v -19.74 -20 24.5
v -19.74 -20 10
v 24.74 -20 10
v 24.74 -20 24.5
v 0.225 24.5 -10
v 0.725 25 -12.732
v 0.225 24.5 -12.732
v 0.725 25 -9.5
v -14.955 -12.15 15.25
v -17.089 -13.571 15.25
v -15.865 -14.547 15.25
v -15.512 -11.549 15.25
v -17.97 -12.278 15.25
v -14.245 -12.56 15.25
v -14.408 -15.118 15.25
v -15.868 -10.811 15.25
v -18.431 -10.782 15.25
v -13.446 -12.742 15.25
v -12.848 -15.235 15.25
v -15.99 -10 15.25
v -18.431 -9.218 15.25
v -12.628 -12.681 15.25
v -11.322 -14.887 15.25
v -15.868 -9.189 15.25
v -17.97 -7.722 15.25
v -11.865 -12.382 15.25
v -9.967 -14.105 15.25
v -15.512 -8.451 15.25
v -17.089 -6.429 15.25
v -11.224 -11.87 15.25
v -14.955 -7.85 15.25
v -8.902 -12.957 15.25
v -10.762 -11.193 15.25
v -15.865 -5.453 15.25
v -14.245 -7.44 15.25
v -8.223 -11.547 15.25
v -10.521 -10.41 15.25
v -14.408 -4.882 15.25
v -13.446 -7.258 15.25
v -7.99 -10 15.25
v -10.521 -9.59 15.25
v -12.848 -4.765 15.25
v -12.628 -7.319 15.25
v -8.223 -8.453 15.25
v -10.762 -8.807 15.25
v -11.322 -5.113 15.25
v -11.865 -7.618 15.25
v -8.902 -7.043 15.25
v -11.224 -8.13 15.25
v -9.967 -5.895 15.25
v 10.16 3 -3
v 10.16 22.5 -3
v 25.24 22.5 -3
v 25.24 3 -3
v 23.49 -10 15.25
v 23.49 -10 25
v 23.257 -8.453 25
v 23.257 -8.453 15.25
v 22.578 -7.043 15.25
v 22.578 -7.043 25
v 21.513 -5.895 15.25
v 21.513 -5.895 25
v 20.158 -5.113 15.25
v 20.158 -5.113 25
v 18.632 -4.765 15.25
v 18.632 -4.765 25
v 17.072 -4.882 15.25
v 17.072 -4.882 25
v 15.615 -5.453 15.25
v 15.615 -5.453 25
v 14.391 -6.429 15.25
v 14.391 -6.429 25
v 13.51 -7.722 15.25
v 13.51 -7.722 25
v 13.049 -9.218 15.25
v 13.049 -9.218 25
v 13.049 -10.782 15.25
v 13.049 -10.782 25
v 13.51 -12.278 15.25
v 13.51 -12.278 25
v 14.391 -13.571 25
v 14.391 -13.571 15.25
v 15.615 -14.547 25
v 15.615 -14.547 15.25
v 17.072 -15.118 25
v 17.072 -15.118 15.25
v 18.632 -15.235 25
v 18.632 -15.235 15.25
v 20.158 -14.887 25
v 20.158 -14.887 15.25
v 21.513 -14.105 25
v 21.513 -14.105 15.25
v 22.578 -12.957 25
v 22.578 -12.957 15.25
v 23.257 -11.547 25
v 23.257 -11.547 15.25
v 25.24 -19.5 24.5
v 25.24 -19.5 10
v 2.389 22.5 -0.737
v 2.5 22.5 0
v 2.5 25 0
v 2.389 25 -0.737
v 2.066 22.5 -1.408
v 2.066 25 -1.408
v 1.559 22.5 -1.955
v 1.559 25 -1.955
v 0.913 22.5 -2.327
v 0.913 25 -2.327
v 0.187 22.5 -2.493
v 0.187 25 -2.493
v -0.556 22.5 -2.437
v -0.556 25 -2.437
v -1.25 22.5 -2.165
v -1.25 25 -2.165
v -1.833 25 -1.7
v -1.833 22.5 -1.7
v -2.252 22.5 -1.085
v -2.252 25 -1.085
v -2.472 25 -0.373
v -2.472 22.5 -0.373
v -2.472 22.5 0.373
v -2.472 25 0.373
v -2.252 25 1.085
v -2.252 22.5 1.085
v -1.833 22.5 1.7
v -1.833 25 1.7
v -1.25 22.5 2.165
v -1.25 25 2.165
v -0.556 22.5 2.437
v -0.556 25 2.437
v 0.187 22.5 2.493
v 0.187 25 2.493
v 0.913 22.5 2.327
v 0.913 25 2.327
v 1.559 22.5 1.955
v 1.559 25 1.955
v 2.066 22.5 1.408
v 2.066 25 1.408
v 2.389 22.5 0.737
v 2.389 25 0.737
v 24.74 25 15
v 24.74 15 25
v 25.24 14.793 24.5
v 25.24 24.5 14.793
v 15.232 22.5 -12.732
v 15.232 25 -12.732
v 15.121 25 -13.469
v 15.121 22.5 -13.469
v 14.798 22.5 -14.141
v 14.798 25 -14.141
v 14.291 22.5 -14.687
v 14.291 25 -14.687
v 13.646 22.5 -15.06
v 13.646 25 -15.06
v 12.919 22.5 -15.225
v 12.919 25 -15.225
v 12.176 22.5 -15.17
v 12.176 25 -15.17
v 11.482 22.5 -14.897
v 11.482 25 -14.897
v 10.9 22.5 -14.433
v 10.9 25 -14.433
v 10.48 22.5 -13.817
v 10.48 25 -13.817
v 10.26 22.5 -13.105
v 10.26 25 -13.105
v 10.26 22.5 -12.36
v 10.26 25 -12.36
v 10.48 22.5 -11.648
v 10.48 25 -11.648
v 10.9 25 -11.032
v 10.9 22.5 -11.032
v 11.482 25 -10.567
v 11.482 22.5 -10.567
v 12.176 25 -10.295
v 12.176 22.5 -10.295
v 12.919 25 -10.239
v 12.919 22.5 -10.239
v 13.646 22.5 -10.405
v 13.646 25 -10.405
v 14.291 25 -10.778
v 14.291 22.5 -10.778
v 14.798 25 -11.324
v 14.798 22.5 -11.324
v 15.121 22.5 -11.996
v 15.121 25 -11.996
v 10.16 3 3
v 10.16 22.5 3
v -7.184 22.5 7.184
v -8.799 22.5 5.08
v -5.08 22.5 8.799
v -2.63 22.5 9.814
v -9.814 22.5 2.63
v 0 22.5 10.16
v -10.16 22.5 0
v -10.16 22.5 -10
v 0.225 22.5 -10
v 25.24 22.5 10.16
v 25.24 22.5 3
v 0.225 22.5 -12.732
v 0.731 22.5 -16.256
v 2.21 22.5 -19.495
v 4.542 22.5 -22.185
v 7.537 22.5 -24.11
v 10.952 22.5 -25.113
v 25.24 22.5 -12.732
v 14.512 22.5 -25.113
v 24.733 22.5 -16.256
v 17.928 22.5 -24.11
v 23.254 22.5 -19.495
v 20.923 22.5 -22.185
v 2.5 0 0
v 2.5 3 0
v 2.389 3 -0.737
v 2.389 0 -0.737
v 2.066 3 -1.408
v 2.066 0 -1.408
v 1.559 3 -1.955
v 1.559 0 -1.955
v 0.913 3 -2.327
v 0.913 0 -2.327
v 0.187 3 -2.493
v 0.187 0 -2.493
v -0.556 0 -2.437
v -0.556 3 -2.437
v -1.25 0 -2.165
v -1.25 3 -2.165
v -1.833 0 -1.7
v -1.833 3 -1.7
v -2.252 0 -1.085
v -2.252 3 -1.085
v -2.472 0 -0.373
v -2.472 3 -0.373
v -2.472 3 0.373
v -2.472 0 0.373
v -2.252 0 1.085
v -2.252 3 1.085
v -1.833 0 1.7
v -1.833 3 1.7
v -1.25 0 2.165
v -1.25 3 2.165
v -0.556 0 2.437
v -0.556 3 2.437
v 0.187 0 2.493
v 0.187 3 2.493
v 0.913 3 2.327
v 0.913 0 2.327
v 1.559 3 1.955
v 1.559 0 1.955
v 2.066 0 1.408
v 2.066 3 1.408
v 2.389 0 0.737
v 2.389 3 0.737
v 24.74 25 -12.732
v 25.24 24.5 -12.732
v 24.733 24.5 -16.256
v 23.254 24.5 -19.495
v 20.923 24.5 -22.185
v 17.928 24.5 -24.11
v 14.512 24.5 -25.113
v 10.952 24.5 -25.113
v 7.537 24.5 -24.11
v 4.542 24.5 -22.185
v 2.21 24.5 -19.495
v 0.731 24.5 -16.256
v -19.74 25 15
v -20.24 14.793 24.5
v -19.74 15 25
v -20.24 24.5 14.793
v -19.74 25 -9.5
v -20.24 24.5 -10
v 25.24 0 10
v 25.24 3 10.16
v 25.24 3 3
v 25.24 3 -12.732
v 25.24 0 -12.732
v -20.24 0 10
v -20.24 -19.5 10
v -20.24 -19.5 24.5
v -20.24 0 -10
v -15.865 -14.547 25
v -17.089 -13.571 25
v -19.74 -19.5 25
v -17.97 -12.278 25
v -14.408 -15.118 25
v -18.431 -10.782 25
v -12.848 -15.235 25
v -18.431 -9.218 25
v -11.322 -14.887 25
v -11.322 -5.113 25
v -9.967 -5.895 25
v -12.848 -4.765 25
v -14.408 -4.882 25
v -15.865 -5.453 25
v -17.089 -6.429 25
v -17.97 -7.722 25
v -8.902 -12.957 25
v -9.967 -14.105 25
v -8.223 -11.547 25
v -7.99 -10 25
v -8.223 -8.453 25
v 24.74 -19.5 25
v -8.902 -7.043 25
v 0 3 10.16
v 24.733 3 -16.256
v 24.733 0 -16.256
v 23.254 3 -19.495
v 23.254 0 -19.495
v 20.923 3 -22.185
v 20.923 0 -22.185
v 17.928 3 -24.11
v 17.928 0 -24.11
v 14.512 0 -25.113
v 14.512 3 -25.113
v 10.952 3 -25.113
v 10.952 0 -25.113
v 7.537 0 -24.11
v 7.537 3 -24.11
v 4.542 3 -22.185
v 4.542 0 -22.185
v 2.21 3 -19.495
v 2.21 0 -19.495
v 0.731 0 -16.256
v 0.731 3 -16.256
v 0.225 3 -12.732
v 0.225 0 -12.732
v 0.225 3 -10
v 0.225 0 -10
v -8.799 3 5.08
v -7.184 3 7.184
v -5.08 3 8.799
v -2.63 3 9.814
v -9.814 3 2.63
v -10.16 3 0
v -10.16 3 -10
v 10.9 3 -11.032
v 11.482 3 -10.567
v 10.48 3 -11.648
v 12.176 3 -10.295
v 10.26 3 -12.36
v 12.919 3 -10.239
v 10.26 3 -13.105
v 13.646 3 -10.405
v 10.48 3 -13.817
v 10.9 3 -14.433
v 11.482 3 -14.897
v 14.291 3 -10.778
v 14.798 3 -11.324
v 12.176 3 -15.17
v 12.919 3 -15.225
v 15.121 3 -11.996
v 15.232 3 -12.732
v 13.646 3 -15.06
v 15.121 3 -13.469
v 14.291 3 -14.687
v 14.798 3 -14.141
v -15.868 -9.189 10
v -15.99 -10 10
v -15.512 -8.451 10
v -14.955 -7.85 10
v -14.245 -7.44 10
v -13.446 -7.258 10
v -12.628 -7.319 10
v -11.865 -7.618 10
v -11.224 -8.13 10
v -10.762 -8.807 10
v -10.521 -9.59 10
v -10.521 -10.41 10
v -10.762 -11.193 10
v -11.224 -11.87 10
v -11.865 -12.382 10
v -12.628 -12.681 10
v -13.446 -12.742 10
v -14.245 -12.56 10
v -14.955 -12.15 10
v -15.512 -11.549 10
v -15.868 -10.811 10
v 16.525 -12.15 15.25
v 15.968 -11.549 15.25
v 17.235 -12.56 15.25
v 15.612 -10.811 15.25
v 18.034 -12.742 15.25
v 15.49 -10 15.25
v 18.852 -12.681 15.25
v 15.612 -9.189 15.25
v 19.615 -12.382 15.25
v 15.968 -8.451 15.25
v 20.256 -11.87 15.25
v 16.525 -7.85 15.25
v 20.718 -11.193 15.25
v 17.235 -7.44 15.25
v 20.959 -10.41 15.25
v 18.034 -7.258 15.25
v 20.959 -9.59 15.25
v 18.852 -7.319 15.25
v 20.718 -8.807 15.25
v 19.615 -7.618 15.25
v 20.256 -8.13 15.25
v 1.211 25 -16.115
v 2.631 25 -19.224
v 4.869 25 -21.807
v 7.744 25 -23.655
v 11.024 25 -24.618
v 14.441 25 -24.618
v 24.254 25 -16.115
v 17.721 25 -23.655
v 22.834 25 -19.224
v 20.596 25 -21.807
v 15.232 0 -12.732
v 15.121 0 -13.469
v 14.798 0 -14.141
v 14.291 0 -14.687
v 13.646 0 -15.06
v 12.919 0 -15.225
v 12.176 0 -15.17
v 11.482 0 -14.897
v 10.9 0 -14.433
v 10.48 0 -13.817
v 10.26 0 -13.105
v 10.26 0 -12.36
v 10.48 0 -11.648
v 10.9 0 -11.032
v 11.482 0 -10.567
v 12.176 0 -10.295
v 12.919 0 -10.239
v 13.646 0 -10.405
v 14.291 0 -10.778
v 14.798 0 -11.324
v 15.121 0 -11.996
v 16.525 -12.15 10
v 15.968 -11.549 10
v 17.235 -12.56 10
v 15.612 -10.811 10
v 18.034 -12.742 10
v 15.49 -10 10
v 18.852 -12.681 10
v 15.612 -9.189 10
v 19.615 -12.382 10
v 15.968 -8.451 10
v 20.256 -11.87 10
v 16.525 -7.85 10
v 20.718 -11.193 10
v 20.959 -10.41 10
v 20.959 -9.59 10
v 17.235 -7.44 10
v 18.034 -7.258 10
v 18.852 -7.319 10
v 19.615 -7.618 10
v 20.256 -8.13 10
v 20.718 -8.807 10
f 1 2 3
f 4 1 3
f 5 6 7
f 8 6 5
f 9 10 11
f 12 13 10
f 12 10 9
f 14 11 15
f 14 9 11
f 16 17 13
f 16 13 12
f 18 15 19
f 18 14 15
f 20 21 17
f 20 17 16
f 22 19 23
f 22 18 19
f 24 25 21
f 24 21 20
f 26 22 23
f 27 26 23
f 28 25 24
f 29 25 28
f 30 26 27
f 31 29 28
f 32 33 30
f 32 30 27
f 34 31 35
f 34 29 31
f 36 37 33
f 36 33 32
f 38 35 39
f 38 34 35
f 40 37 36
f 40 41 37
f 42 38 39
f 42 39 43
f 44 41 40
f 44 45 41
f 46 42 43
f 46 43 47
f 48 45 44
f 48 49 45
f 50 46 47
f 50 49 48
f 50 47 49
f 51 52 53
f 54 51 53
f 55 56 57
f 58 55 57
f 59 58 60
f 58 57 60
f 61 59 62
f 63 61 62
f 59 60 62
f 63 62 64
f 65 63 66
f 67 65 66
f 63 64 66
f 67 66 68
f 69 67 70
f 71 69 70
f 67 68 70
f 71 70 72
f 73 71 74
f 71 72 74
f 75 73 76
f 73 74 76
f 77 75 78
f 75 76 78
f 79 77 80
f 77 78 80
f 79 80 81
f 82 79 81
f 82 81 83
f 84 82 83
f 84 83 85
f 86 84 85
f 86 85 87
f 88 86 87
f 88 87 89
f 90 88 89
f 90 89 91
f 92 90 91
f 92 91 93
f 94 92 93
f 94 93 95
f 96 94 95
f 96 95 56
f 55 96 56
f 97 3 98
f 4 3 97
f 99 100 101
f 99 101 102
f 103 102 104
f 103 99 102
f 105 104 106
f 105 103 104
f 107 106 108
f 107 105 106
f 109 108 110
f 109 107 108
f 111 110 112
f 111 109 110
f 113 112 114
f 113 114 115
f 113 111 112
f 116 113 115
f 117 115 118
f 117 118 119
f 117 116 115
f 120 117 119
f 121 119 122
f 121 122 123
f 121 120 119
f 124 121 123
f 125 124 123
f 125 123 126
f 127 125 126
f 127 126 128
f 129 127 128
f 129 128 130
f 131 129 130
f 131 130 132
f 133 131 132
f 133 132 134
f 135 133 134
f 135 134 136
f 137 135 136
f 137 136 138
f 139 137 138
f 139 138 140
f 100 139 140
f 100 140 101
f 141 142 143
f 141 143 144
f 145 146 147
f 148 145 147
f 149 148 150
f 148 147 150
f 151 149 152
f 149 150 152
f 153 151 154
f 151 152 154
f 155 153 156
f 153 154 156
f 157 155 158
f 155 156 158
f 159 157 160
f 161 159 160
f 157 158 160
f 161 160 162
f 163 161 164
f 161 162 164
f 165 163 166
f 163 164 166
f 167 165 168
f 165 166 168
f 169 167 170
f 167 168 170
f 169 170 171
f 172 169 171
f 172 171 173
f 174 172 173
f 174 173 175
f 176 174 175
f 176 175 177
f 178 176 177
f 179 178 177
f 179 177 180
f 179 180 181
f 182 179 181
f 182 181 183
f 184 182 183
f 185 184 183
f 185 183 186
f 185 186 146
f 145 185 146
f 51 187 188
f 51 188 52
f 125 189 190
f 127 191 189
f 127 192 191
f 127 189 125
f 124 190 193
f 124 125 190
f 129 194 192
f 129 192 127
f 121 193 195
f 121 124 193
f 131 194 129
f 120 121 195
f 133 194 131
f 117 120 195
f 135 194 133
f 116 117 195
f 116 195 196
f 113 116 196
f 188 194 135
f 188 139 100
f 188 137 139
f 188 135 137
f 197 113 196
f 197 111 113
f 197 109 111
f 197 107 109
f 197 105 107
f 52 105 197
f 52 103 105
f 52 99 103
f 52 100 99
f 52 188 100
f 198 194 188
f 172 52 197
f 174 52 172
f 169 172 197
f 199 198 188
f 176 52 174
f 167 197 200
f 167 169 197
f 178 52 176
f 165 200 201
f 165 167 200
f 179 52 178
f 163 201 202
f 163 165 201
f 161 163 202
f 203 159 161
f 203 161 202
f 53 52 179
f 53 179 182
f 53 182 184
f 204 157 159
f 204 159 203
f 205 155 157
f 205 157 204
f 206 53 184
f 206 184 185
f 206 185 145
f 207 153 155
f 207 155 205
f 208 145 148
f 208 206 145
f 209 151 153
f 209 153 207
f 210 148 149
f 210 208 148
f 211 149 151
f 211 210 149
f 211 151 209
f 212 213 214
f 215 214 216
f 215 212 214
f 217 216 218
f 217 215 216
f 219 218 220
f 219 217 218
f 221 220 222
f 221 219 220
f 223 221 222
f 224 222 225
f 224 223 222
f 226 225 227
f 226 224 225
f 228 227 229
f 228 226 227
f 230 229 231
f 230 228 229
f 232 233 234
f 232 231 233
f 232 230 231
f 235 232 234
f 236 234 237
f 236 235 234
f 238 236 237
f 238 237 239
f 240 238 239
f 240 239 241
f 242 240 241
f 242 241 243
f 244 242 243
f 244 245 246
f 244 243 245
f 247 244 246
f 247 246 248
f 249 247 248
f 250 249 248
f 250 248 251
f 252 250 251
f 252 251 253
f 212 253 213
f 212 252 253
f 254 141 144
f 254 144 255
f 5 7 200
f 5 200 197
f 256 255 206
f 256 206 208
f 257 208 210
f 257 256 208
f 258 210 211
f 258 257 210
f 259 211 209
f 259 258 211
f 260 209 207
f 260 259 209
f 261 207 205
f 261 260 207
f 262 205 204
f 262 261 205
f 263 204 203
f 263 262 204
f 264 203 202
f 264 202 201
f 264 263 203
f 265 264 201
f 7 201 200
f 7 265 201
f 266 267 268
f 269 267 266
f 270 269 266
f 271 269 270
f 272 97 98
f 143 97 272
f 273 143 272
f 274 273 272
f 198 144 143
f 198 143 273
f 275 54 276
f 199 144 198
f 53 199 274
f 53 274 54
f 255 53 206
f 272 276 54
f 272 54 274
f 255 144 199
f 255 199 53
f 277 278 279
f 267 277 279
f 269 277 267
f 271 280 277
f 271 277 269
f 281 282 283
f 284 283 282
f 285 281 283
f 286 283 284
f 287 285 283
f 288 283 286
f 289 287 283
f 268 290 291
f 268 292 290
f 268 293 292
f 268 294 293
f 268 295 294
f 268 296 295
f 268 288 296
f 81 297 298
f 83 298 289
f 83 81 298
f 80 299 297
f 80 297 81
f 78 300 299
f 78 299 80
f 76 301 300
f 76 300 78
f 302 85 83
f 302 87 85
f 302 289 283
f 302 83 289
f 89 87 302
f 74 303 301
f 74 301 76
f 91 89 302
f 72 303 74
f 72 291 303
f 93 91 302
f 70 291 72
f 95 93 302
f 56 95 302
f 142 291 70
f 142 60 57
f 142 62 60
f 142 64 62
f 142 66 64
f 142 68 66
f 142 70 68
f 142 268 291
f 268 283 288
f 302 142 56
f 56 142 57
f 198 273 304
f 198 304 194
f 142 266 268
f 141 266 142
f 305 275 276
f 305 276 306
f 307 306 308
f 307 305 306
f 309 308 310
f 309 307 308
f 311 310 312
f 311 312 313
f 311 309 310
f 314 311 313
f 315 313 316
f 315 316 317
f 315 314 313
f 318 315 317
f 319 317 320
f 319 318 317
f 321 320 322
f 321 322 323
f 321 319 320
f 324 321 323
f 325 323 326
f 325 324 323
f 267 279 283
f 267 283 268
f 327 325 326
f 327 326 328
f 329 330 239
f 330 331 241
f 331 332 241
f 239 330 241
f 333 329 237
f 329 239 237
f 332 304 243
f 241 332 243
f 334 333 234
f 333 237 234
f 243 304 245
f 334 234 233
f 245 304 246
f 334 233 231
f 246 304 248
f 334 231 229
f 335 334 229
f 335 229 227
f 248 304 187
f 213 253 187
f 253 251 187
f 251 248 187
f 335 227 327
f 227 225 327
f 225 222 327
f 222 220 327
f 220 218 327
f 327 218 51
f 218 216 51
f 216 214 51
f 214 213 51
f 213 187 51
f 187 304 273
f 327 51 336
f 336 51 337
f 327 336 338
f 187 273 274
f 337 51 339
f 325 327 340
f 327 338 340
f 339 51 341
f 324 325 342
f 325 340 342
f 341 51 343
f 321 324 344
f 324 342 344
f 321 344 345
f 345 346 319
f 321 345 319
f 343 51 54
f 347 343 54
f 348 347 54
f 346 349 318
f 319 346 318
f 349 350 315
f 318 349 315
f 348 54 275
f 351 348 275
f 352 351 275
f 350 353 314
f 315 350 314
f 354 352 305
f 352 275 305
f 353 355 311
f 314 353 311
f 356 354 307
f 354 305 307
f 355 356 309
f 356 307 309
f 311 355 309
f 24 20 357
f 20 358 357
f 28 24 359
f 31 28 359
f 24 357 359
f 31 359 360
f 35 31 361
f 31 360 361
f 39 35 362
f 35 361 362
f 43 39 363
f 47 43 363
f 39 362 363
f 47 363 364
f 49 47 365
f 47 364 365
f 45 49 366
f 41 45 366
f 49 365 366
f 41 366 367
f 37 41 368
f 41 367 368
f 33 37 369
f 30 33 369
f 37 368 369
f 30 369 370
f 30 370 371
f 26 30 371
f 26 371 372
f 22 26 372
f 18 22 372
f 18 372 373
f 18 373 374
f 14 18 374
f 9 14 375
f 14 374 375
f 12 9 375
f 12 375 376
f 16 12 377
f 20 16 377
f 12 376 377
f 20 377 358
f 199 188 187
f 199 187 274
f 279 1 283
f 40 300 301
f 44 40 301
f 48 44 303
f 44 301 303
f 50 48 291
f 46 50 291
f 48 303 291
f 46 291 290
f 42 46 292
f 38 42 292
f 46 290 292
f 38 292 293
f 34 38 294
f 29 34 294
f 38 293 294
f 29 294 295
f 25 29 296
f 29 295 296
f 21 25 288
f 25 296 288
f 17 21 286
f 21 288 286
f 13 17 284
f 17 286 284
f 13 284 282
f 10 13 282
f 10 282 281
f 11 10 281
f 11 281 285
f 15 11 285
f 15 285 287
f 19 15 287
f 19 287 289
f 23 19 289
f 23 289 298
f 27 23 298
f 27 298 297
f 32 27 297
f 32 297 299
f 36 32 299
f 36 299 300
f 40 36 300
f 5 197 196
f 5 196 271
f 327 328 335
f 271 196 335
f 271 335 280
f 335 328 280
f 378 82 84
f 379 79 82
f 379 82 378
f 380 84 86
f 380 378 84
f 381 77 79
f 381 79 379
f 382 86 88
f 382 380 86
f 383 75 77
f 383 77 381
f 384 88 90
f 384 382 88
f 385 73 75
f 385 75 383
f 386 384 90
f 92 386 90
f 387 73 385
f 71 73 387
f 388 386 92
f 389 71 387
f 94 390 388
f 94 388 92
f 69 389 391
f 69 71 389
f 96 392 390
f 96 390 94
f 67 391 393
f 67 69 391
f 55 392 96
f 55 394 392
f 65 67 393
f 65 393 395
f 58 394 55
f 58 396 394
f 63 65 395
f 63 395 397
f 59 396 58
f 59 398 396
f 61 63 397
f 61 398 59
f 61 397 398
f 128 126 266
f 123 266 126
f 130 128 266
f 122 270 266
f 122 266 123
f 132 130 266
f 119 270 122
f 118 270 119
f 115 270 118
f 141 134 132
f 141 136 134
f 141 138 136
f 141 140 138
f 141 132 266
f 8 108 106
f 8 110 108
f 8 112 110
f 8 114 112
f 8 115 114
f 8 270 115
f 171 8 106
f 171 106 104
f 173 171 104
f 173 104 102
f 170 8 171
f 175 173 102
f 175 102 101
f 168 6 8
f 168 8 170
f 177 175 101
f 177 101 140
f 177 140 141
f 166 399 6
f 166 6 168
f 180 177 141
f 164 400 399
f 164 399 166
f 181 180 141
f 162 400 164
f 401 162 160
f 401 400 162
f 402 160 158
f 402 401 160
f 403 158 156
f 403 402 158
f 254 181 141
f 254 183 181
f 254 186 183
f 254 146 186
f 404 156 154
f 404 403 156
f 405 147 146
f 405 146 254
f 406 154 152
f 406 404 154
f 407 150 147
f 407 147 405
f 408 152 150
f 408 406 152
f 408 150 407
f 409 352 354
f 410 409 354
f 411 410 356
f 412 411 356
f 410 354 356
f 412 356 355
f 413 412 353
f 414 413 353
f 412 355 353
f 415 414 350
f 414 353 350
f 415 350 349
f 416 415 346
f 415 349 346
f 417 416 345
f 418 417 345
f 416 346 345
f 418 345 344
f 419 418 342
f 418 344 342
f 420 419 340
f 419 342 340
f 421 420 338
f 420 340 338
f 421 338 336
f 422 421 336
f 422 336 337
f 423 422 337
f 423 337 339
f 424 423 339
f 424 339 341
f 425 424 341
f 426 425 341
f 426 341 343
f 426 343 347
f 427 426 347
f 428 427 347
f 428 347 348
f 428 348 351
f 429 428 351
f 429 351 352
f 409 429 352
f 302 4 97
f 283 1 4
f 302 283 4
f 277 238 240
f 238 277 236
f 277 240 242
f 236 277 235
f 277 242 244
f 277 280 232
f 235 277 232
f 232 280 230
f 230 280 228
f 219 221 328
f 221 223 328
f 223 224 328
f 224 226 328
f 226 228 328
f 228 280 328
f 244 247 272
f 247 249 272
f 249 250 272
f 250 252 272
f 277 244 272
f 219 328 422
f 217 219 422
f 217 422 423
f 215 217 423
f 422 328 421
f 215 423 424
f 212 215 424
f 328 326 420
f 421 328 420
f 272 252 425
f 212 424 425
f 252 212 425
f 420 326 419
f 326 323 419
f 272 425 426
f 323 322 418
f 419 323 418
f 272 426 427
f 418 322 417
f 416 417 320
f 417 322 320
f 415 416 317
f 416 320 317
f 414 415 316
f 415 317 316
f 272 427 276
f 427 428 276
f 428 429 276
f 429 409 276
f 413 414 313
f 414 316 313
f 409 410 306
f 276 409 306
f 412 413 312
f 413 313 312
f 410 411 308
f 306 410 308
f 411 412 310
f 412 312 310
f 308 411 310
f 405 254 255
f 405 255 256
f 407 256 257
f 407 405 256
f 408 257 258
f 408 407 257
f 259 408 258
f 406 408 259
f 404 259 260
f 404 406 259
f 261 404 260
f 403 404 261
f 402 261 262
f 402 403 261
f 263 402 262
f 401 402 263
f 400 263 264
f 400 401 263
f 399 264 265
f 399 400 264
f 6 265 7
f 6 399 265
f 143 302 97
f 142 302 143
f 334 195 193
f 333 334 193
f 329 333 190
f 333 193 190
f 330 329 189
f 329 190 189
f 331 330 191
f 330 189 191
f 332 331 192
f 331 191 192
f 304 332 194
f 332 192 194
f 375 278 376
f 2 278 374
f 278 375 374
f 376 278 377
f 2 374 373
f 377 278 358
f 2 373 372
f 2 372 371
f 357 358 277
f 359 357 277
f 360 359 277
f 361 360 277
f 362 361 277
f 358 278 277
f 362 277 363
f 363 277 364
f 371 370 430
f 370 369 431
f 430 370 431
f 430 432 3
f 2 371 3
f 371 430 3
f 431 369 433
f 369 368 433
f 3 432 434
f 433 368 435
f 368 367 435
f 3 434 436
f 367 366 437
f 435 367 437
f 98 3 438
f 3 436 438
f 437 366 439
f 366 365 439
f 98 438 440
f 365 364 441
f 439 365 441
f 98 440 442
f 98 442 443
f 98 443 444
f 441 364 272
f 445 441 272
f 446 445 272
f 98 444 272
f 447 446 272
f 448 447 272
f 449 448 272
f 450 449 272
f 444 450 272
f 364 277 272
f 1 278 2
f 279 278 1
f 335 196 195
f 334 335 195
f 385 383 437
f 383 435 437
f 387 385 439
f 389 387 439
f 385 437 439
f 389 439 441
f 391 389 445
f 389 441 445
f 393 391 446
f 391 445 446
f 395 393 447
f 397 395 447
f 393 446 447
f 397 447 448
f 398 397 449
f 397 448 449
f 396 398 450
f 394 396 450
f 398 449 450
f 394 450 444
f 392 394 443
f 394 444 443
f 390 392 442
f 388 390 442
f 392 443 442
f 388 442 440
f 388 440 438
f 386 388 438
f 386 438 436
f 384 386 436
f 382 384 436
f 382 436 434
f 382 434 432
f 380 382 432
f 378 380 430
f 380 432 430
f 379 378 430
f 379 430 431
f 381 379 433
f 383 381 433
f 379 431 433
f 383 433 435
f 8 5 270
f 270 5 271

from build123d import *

# Parameters (mm, degrees)
SKETCH1_R                       = 2.5
BOSS_EXTRUDE1_DEPTH             = 25
SKETCH9_W                       = 45.48
SKETCH9_H                       = 45
BOSS_EXTRUDE4_DEPTH             = 15
CUT_EXTRUDE2_START              = -2.5
CUT_EXTRUDE2_DEPTH              = 19.5
SKETCH15_R                      = 2.5
BOSS_EXTRUDE5_DEPTH             = 25
CHAMFER1_SIZE                   = 10
CUT_EXTRUDE3_REACH              = 47.48
SKETCH16_W                      = 40
SKETCH16_H                      = 19.5
SKETCH17_W                      = 15.08
SKETCH17_H                      = 6
BOSS_EXTRUDE6_DEPTH             = 22
CBORE_FOR_M5_SBHCS1_D           = 5.5
CBORE_FOR_M5_SBHCS1_CBORE_D     = 10.5
CBORE_FOR_M5_SBHCS1_CBORE_DEPTH = 9.75
CHAMFER2_SIZE                   = 0.5


with BuildPart() as part:
    # Sketch1 → Boss-Extrude1 (new body)
    with BuildSketch(Plane(origin=(0, 0, 0), x_dir=(1, 0, 0), z_dir=(0, 1, 0))):
        Polygon((20.24, -10), (25.24, -10), (25.24, 10), (20.24, 10), (-20.24, 10), (-20.24, -10), align=None)
        Circle(SKETCH1_R, mode=Mode.SUBTRACT)
    extrude(amount=BOSS_EXTRUDE1_DEPTH)

    # Sketch9 → Boss-Extrude4 (add)
    with BuildSketch(Plane.XY.offset(10)):
        with Locations((2.5, 2.5)):
            Rectangle(SKETCH9_W, SKETCH9_H)
    extrude(amount=BOSS_EXTRUDE4_DEPTH)

    # Sketch10 → Cut-Extrude2 (cut)
    with BuildSketch(Plane(origin=(0, 25, 0), x_dir=(1, 0, 0), z_dir=(0, 1, 0)).offset(CUT_EXTRUDE2_START)):
        with BuildLine():
            Line((10.16, 0), (10.16, 10))
            Line((10.16, 10), (-10.16, 10))
            Line((-10.16, 10), (-10.16, 0))
            ThreePointArc((-10.16, 0), (0, -10.16), (10.16, 0))
        make_face()
    extrude(amount=-CUT_EXTRUDE2_DEPTH, mode=Mode.SUBTRACT)

    # Sketch15 → Boss-Extrude5 (add)
    with BuildSketch(Plane(origin=(0, 25, 0), x_dir=(1, 0, 0), z_dir=(0, 1, 0))):
        with BuildLine():
            Line((25.24, 10), (25.24, 12.732395665))
            ThreePointArc((25.24, 12.732395665), (12.732395665, 25.24), (0.224791329, 12.732395665))
            Line((0.224791329, 12.732395665), (0.224791329, 10))
            Line((0.224791329, 10), (25.24, 10))
        make_face()
        with Locations((12.732395665, 12.732395665)):
            Circle(SKETCH15_R, mode=Mode.SUBTRACT)
    extrude(amount=-BOSS_EXTRUDE5_DEPTH)

    # Chamfer1
    chamfer1_edges = [part.edges().sort_by_distance(p)[0] for p in [
        (2.5, 25, 25),
    ]]
    chamfer(chamfer1_edges, length=CHAMFER1_SIZE)

    # Sketch16 → Cut-Extrude3 (cut, up to next)
    with BuildSketch(Plane(origin=(25.24, 0, 0), x_dir=(0, 0, -1), z_dir=(1, 0, 0)), mode=Mode.PRIVATE) as cut_extrude3_sk1:
        with Locations((9.84, 12.75)):
            Rectangle(SKETCH16_W, SKETCH16_H)
    cut_extrude3_tool1 = extrude(cut_extrude3_sk1.sketch, amount=-CUT_EXTRUDE3_REACH, mode=Mode.PRIVATE) & part.part
    add(cut_extrude3_tool1.solids().sort_by_distance((25.24, 12.75, -9.84))[0], mode=Mode.SUBTRACT)

    # Sketch17 → Boss-Extrude6 (add)
    with BuildSketch(Plane(origin=(0, 25, 0), x_dir=(1, 0, 0), z_dir=(0, 1, 0))):
        with Locations((17.7, 0)):
            Rectangle(SKETCH17_W, SKETCH17_H)
    extrude(amount=-BOSS_EXTRUDE6_DEPTH)

    # CBORE for M5 SBHCS1 (through all)
    with Locations(Plane.XY.offset(25)):
        with Locations((-13.24, -10), (18.24, -10)):
            CounterBoreHole(CBORE_FOR_M5_SBHCS1_D / 2, CBORE_FOR_M5_SBHCS1_CBORE_D / 2, CBORE_FOR_M5_SBHCS1_CBORE_DEPTH)

    # Chamfer2
    chamfer2_edges = [part.edges().sort_by_distance(p)[0] for p in [
        (-20.24, 25, 2.5),
        (-20.24, -20, 17.5),
        (25.24, -20, 17.5),
        (2.5, -20, 25),
        (25.24, -2.5, 25),
        (-10.007604335, 25, -10),
        (12.732395665, 25, -25.24),
        (0.224791329, 25, -11.366197832),
        (-20.24, -2.5, 25),
        (-20.24, 20, 20),
        (25.24, 25, 1.133802168),
        (25.24, 20, 20),
    ]]
    chamfer(chamfer2_edges, length=CHAMFER2_SIZE)


solid = part.part
